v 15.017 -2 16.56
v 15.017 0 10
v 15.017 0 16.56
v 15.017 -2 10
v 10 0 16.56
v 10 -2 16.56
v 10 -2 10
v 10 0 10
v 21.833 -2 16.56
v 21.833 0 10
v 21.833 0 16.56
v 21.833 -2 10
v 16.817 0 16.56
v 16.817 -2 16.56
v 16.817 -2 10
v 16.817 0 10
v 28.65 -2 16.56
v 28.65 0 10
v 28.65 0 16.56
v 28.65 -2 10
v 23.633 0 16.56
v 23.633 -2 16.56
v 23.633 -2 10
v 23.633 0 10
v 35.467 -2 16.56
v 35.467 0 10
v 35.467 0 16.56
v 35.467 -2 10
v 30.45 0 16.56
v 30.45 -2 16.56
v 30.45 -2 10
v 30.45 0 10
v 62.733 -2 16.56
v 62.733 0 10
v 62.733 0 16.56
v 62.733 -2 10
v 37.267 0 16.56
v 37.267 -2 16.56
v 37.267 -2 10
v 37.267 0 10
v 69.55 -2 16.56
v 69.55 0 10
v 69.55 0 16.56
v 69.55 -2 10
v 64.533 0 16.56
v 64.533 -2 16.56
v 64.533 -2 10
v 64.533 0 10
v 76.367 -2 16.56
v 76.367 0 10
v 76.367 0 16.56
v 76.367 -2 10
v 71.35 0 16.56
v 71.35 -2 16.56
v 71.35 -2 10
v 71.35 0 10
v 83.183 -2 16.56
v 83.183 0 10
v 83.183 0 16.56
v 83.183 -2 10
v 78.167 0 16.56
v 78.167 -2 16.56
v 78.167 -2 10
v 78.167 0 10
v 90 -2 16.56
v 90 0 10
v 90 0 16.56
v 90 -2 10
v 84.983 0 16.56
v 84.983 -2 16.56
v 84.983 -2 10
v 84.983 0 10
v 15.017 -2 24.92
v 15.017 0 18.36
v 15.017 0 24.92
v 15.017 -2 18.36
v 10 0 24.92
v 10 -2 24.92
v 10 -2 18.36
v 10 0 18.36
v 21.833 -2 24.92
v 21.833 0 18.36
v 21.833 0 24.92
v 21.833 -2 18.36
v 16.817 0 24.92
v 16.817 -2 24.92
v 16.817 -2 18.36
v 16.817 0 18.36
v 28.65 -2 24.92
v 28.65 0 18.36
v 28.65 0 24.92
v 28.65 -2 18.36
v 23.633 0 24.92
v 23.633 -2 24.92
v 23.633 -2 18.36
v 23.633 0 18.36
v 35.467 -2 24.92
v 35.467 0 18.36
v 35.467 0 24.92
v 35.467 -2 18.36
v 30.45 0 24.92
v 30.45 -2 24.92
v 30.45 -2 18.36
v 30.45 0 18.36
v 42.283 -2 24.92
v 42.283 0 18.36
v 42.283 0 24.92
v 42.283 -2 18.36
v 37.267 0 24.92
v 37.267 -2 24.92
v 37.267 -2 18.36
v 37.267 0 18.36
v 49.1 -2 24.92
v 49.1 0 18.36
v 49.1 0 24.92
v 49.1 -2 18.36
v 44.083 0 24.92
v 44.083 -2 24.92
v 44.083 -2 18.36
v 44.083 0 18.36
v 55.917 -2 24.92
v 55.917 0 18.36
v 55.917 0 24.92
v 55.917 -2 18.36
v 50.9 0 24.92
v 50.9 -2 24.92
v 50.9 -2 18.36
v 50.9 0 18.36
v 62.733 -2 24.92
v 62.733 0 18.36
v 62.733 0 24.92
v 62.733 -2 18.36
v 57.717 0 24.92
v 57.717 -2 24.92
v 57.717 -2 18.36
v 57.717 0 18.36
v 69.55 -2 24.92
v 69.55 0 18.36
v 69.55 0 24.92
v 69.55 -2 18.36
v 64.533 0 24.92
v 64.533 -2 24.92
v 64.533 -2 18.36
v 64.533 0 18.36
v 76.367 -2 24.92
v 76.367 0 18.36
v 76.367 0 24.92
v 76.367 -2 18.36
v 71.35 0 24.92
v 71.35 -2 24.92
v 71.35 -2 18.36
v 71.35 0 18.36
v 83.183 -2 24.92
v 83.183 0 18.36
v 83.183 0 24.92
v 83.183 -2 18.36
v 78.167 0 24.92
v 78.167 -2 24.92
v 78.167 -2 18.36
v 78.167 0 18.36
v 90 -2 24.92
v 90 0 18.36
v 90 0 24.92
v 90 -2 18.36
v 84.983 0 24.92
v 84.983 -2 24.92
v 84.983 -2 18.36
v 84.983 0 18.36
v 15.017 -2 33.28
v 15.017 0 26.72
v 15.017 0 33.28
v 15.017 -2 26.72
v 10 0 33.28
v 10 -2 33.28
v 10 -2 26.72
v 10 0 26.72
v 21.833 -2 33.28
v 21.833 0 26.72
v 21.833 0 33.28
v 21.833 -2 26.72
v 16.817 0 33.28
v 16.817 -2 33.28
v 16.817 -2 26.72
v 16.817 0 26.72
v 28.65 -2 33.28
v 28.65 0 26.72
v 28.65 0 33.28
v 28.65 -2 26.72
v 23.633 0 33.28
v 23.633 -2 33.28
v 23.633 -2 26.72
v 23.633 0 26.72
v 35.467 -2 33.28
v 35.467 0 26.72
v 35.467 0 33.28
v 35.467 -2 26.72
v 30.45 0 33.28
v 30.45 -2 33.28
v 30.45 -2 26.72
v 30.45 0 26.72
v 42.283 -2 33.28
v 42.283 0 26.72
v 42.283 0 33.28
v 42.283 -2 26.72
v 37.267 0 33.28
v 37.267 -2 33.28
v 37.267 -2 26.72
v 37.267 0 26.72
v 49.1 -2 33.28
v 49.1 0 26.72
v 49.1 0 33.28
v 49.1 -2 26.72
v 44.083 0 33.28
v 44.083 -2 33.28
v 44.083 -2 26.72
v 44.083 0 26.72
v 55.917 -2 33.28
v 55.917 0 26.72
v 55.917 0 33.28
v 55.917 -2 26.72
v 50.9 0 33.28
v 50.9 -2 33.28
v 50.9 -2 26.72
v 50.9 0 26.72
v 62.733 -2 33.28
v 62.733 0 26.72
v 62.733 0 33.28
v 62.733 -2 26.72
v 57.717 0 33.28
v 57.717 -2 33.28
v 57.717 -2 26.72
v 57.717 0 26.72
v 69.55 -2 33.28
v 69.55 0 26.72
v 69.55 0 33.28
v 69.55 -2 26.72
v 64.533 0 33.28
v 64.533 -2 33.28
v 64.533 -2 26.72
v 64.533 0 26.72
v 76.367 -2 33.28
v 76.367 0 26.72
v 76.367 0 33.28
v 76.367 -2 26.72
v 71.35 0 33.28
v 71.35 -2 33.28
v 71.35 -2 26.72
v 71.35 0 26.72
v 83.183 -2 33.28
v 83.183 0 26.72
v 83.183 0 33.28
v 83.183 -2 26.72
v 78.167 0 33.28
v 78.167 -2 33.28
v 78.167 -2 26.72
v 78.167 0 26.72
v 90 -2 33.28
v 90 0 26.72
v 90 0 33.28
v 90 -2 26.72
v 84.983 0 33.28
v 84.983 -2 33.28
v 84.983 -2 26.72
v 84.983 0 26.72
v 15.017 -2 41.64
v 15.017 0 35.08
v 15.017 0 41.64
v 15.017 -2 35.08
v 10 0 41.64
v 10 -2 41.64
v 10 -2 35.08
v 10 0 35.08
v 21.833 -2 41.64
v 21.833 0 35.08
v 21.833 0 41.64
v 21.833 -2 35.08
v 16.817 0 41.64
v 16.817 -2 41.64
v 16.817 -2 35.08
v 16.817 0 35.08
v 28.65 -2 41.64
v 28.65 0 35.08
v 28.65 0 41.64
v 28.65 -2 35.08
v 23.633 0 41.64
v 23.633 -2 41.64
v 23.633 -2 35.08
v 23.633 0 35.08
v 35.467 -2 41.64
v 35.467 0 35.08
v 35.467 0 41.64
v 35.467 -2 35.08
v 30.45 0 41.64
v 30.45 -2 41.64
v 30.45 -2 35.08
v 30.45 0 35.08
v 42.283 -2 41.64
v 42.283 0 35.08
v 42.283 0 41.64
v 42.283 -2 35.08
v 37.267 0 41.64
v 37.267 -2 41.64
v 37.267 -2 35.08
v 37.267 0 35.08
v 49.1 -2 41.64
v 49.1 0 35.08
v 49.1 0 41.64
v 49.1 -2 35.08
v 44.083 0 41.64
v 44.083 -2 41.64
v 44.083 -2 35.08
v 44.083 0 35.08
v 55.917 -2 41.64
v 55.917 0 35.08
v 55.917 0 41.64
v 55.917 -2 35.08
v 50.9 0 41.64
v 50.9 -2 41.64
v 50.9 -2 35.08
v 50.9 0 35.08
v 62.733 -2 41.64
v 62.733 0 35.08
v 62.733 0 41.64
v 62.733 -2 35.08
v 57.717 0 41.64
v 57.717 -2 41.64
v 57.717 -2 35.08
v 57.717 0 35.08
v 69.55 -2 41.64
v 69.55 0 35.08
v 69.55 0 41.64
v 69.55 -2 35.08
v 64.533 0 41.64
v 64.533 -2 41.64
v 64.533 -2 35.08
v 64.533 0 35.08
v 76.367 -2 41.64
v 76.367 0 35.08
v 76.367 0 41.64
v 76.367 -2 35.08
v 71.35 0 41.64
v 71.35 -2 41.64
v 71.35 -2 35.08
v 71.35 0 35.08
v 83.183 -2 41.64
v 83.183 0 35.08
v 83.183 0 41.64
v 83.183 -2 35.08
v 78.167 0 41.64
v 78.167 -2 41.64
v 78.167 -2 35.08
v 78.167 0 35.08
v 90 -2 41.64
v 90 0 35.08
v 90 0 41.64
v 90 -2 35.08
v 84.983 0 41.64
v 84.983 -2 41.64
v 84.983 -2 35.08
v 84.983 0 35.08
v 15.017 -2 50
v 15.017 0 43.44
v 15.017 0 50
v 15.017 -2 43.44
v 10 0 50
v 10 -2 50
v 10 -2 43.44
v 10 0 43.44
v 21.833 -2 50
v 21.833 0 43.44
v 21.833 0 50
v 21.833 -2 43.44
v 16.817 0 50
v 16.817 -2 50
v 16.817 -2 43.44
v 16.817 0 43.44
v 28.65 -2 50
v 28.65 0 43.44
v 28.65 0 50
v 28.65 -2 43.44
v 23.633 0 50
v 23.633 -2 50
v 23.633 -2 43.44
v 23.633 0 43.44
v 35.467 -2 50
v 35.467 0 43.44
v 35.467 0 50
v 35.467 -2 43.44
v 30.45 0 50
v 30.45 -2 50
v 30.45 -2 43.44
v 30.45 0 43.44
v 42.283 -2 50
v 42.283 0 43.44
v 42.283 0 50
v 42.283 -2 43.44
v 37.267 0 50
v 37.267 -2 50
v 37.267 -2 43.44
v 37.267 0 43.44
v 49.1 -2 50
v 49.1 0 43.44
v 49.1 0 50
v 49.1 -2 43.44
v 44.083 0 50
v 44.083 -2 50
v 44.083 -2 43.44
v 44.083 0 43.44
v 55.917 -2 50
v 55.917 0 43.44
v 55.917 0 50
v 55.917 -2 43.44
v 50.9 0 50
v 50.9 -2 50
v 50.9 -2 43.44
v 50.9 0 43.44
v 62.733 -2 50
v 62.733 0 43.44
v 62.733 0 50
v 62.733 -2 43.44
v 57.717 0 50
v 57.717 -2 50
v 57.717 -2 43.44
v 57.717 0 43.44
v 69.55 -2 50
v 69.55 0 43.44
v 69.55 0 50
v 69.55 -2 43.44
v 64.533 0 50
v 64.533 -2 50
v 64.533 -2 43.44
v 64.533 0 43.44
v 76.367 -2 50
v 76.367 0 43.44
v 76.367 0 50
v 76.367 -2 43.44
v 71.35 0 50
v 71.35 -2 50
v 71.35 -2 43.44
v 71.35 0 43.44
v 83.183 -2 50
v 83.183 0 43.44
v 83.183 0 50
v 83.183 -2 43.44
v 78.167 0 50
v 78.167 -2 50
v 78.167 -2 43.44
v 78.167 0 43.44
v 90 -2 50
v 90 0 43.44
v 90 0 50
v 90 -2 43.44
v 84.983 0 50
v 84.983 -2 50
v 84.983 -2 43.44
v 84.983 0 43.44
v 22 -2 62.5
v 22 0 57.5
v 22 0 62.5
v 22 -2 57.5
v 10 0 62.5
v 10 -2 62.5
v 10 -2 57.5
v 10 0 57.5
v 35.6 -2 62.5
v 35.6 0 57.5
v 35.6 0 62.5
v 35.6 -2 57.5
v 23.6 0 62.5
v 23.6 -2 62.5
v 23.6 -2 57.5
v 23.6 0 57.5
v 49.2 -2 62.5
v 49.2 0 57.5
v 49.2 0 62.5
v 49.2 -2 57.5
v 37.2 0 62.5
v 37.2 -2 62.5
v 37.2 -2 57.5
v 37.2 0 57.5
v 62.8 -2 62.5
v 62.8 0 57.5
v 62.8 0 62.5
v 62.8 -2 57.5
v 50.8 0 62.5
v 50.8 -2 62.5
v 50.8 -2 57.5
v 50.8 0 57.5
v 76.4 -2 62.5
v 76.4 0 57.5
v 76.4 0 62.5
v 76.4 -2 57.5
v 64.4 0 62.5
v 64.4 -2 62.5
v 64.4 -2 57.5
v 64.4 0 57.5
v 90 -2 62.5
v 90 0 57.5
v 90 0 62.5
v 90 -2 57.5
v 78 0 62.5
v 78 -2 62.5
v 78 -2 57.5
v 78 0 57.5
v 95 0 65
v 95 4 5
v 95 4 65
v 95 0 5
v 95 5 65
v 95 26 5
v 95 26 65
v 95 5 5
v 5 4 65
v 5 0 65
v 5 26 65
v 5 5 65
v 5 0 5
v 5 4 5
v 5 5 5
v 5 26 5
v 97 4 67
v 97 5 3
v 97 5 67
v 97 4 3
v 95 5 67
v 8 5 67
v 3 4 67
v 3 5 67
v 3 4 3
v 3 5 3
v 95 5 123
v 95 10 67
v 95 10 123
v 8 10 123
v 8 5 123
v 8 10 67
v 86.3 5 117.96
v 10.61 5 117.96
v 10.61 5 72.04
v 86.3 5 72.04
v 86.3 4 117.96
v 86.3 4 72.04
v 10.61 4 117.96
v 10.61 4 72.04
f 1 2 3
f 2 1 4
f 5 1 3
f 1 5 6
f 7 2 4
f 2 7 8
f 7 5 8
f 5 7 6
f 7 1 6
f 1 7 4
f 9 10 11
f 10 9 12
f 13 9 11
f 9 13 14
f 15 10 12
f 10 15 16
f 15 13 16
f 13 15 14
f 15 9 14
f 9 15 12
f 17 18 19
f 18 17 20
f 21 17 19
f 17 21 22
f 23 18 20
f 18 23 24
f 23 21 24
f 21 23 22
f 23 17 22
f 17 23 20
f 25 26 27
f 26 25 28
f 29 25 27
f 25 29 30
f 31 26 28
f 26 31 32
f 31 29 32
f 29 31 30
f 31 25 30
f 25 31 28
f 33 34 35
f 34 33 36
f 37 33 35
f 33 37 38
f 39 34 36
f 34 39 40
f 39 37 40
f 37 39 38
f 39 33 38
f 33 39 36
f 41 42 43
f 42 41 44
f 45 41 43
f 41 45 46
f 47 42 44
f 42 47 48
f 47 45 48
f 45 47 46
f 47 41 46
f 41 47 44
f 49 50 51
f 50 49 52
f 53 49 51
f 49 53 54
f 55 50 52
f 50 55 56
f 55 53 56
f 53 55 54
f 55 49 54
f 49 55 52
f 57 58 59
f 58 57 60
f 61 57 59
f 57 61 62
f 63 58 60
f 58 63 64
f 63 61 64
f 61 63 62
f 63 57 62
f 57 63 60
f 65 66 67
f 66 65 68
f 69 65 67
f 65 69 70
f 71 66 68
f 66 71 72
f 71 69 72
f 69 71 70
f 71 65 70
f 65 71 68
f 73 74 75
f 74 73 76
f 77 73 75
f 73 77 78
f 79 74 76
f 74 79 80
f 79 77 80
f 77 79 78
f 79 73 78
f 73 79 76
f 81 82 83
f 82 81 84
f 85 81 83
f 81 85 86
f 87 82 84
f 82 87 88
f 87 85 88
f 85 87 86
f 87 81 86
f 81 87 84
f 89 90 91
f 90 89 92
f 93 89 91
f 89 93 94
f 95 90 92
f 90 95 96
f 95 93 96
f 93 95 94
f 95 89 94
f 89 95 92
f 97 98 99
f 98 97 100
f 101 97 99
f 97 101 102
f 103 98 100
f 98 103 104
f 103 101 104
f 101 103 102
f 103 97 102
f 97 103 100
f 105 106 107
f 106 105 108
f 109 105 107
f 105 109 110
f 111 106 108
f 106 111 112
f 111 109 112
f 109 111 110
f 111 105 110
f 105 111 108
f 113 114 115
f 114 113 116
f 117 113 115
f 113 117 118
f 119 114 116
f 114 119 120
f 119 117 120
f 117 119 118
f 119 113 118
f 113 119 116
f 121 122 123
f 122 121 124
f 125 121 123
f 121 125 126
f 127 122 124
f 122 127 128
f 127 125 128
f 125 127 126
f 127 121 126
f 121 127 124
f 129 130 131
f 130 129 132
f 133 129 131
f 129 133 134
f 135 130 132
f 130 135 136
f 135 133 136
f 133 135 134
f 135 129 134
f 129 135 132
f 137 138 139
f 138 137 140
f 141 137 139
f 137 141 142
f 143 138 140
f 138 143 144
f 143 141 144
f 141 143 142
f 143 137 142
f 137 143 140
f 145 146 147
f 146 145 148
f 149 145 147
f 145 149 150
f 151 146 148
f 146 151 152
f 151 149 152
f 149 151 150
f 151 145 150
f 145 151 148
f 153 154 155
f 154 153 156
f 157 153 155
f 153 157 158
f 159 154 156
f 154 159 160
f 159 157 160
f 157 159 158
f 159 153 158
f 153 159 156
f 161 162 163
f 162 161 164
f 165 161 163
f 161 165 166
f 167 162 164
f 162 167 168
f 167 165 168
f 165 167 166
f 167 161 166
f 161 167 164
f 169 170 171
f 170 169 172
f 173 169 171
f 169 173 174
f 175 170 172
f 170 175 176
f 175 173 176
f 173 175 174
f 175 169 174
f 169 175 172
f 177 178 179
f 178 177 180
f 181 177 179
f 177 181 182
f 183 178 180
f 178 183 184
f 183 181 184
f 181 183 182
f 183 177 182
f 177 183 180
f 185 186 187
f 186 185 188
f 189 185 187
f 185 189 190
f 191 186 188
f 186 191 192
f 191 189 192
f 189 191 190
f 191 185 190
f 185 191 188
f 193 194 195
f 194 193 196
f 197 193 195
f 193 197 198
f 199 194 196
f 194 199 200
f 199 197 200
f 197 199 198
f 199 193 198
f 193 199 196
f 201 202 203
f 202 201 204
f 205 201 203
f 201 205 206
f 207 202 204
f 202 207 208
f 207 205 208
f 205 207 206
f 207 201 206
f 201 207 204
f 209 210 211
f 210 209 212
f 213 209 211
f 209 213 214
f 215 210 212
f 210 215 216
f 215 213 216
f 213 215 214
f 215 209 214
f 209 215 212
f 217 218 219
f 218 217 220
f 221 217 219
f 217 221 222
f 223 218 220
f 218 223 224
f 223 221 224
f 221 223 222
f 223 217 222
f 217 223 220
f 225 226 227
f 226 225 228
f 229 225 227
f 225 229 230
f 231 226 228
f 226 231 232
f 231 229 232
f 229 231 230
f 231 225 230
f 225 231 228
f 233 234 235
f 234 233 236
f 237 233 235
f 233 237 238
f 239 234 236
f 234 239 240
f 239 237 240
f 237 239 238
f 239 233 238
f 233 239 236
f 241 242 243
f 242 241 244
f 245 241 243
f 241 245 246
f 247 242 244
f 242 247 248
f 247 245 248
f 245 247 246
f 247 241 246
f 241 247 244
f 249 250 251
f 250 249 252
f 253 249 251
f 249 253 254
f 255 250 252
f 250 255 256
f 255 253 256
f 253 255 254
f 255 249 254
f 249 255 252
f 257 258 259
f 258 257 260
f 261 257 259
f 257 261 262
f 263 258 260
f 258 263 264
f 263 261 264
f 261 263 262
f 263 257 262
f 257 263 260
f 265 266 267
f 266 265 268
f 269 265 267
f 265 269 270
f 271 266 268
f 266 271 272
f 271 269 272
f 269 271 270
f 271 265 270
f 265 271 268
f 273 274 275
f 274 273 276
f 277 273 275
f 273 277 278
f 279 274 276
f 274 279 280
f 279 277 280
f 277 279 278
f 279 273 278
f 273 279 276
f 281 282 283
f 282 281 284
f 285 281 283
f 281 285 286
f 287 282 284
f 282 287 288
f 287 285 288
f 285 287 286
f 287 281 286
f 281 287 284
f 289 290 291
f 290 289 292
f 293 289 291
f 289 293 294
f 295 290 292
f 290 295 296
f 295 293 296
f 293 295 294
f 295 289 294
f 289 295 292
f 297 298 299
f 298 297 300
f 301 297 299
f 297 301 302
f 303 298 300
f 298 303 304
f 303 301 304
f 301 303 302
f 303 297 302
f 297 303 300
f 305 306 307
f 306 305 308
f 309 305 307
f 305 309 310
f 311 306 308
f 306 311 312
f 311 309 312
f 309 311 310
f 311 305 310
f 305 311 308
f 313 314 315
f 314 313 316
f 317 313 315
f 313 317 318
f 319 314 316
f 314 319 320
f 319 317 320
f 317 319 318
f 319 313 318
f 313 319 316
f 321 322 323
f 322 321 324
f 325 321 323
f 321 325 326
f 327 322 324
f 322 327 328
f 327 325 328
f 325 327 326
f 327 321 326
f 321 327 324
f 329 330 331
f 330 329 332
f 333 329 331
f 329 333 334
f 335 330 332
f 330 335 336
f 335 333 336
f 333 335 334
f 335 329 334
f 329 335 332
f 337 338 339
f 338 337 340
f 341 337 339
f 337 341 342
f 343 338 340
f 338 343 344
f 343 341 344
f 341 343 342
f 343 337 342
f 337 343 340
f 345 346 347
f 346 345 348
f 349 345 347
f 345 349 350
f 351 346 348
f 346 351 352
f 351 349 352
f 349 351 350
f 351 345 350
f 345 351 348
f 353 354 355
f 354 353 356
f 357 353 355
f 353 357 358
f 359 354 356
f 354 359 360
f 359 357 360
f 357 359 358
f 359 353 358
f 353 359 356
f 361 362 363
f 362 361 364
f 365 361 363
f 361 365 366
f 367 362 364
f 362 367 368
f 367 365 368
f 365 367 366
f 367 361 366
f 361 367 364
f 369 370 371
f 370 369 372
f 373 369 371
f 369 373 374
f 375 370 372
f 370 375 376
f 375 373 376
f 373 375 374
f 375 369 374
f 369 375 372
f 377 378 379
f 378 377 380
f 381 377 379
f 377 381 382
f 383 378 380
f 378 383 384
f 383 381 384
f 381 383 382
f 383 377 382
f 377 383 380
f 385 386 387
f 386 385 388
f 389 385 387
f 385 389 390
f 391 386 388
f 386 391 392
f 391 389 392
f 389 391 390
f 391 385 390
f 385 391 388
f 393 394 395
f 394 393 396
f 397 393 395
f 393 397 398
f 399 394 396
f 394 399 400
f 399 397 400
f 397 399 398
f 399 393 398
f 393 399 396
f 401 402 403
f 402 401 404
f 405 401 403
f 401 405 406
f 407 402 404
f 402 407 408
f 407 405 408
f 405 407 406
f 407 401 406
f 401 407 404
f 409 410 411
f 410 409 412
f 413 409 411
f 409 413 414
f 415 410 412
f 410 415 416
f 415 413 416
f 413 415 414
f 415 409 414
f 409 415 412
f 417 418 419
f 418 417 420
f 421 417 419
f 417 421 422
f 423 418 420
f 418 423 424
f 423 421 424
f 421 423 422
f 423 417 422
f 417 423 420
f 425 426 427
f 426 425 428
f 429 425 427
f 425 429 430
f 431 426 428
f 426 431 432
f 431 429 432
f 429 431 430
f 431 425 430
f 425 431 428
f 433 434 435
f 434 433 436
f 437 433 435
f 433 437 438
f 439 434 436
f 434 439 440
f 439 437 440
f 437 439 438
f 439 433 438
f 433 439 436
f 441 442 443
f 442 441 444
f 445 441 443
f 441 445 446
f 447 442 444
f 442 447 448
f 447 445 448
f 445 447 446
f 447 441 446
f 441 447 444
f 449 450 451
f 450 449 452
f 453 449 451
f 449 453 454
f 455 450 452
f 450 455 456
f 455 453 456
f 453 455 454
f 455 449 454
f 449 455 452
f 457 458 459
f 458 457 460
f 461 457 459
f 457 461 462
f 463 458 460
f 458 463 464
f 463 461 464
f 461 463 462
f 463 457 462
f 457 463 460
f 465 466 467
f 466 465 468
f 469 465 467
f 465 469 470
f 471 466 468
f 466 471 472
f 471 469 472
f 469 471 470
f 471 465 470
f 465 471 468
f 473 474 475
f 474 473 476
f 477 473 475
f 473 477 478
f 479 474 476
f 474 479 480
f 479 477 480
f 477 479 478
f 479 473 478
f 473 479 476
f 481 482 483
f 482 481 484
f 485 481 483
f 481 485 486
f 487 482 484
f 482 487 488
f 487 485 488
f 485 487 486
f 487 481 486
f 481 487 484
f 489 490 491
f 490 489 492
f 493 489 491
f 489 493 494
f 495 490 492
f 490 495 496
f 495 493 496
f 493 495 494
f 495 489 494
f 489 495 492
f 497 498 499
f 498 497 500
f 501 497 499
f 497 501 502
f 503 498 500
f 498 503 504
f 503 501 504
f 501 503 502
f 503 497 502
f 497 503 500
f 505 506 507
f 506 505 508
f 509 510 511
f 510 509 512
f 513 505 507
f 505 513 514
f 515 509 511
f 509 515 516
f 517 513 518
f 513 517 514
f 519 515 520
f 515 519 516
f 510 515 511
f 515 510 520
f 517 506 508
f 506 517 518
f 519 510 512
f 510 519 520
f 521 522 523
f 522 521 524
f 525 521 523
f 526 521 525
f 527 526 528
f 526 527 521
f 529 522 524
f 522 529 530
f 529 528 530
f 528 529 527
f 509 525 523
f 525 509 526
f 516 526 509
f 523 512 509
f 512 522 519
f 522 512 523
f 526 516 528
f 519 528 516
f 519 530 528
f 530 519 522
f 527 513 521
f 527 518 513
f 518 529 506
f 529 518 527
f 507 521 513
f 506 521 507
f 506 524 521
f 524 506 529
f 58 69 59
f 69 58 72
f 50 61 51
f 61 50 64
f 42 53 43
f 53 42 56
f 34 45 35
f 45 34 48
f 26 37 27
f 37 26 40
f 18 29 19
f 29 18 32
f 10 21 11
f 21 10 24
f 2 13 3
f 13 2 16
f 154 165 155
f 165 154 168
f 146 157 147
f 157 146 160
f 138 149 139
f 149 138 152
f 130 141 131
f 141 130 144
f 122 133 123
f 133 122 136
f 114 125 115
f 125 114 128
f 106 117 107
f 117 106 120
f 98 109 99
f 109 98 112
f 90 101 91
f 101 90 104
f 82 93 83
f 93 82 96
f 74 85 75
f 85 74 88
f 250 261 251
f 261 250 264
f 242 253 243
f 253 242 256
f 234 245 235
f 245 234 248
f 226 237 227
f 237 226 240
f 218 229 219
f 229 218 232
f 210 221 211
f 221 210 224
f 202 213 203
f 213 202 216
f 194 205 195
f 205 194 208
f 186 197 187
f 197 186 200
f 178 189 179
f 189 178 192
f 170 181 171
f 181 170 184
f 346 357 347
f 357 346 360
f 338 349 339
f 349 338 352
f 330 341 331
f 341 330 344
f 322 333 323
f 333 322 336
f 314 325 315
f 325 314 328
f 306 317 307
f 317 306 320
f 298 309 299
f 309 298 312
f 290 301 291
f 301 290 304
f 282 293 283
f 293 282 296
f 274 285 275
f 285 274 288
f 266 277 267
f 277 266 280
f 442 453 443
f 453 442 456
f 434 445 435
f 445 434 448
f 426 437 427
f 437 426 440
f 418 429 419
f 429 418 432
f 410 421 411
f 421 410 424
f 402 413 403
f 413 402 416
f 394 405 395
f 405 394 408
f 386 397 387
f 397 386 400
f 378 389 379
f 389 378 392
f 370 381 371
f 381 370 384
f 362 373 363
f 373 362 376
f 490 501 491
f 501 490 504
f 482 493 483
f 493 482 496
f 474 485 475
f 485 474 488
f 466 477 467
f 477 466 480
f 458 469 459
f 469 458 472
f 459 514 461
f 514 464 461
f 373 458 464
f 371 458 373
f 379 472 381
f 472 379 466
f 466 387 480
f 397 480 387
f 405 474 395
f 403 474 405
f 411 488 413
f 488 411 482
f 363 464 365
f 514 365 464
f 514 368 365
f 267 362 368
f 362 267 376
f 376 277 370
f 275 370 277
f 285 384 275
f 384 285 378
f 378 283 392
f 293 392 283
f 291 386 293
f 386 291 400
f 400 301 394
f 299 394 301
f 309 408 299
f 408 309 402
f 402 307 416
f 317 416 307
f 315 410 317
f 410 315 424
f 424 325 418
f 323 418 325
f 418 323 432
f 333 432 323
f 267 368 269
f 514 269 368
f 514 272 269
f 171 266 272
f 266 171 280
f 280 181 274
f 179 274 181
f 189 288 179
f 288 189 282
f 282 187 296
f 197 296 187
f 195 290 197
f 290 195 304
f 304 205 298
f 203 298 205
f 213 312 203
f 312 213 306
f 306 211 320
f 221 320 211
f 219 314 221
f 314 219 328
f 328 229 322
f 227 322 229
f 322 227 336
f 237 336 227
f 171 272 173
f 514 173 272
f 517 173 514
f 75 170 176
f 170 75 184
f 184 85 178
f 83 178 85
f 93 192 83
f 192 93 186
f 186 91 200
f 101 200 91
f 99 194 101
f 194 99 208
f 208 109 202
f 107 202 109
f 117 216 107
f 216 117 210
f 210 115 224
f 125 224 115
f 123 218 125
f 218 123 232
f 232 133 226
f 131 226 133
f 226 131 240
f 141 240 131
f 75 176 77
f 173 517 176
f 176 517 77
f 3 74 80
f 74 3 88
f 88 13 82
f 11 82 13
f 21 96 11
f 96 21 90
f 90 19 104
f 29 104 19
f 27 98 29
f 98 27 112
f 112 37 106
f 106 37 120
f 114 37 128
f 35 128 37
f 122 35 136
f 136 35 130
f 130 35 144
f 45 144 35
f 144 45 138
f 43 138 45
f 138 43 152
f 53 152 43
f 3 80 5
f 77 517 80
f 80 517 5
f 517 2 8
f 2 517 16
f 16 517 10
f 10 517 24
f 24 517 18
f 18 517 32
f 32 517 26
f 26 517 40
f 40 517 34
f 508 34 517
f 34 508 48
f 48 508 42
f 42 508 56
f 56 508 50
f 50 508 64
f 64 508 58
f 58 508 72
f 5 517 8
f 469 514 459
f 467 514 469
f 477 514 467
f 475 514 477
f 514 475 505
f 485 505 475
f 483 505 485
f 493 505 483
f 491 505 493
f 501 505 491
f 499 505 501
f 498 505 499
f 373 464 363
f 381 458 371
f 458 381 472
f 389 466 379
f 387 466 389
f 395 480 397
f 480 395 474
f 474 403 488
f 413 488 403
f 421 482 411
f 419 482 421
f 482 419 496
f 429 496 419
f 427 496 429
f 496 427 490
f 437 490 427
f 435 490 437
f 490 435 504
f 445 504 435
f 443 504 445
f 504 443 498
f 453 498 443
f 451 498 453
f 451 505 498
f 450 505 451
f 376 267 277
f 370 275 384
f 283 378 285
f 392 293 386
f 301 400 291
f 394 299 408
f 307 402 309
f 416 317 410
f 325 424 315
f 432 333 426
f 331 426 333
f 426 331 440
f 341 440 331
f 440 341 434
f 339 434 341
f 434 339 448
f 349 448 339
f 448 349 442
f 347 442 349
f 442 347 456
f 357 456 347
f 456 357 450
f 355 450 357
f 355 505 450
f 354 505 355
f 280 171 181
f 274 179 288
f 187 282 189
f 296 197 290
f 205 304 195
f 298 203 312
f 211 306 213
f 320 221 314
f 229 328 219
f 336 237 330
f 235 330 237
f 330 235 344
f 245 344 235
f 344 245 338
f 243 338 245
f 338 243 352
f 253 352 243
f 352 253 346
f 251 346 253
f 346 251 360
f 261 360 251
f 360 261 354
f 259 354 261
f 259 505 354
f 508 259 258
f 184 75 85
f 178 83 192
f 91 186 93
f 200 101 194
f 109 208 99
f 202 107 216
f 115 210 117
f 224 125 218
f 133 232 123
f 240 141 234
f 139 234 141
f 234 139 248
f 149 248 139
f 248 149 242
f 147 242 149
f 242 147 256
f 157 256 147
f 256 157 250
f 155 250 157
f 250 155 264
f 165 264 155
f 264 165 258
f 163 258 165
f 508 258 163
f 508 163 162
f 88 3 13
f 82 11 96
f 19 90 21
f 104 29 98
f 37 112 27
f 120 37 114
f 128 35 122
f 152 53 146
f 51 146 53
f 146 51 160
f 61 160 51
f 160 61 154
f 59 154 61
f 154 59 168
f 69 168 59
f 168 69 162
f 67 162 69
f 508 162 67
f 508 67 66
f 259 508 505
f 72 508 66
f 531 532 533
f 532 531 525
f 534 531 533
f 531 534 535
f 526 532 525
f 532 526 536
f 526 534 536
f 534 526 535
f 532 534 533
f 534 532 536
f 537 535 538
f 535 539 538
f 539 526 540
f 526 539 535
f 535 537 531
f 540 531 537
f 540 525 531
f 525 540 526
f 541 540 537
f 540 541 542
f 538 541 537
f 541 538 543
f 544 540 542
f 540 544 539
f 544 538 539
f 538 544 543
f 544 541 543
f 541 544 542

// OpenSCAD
key_depth = 8;
wall_thickness = 5;

module _kb_buttons(rows, cols, key_w, key_h, gap) {
    for (row = [0:rows-1]) {
        for (col = [0:cols-1]) {
            translate([col * (gap + key_w), -key_depth, row * (gap + key_h)])
            if (row == 0 && 3 < col && col < 8) {
                if (col == 4)
                    cube([(key_w+gap) * 4 - gap, key_depth, key_h]);
            } else
                cube([key_w, key_depth, key_h]);
        }
    }    
}

module Keyboard(cutout=false) {
    rows = 5;
    cols = 12;
    width = 90;
    height = 50;
    margin = 5;
    margin_h = margin / 2;
    lip = 4;
    
    gap = 1.8;
    key_w = (width - 2*margin - (cols-1) * gap) / cols;
    key_h = (height - 2*margin - (rows-1) * gap) / rows;
    mkey_w = 12;
    mkey_h = 5;
    mkey_gap = (width - 2*margin - 6*mkey_w) / 5;
    macro_h = mkey_h + margin;
    
    union() {
        color("blue") translate([-lip/2, -1, -lip/2]) cube([
            width+lip, 1, height+macro_h+lip
        ]);
        color("blue") translate([0, -5, 0]) cube([width, 6, height+macro_h]);
        translate([0, 1, 0]) {
            cube([width, 20, height]);
            if (!cutout) {
                translate([margin, 0, margin]) {
                    color("darkgray") _kb_buttons(rows, cols, key_w, key_h, gap);
                }
            }
            translate([0, 0, height]) {
                cube([width, 20, macro_h]);
                if (!cutout) {    
                    color("darkgray")
                    translate([margin, -key_depth, margin / 2])
                    for (i = [0:5]) {
                        translate([(mkey_w+mkey_gap)*i, 0, 0])
                            cube([mkey_w, key_depth, mkey_h]);
                    }
                }
            }
        }
    }
}

module Screen(cutout=false) {
    // https://it.aliexpress.com/item/1005007579014355.html
    scr_width = 87;
    scr_height = 56;
    left_bezel = 87 * 0.03;
    right_bezel = 87 * 0.1;
    hori_bezel = left_bezel + right_bezel;
    vert_bezel = scr_height * 0.09;
        
    if (!cutout) color("black") cube([scr_width, 5, scr_height]);
    color("white") translate([left_bezel, -1, vert_bezel])
        cube([
            scr_width - hori_bezel,
            cutout ? 10 : 2,
            scr_height - 2*vert_bezel
        ]);
}

module Frontplate() {
    difference() {
        cube([90 + 2*wall_thickness, 5, 116 + 2*wall_thickness]);
        translate([wall_thickness+3, 0, 67]) Screen(cutout=true);
        translate([wall_thickness, -1, wall_thickness]) Keyboard(cutout=true);
    }
}

*Frontplate();

translate([wall_thickness, wall_thickness, wall_thickness]) {
    Keyboard();
    translate([3, 0, 62]) Screen();
}
